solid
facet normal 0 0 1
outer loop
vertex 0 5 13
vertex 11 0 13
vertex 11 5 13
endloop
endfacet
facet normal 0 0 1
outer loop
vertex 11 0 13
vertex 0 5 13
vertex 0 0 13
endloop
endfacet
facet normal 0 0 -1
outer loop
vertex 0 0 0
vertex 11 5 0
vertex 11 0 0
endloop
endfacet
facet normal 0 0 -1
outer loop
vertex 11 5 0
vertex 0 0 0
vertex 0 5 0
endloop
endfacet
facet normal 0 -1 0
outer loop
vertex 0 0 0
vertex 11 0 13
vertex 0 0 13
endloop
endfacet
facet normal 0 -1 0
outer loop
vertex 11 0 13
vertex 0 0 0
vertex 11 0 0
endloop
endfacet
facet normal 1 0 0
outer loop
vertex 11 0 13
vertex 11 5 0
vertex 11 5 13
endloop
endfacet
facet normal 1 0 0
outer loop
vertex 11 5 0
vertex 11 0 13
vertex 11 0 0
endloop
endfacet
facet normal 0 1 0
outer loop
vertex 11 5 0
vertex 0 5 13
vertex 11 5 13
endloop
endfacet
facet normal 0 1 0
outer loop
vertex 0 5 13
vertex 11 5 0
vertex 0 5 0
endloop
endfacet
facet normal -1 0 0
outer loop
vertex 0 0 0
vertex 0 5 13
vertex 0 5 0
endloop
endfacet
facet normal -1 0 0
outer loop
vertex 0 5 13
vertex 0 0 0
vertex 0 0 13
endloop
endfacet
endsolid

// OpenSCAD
// Generated by SolidPython 1.0.1 on 2020-07-29 00:46:55


cube(size = [11, 5, 13]);
/***********************************************
*********      SolidPython code:      **********
************************************************
 
# import packages: SolidPython
from solid import *
from solid.utils import *
from itertools import chain, combinations, permutations


class Resize:

    def __init__(self, scad_file):
        self.scad_file = scad_file
        #self.scad_file = import_scad(scad_file)
        # cone/cylinder param:
        self.r1 = 0
        self.r2 = 0
        self.h = 0
        # rectangular prism param:
        self.w = 0
        self.l = 0
        # ellipse param:
        self.r = 0

    # import OpenScad code (file name corresponds to shape)


    # classify shape + parameters
    def assign(self, param1, param2, param3):
        if self.scad_file == 'cone.scad':
            self.r1 = param1
            self.r2 = param2
            self.h = param3
        elif self.scad_file == 'cylinder.scad':
            self.r1 = param1
            self.r2 = param2
            self.h = param3
        elif self.scad_file == 'rectangularPrism.scad':
            self.h = param1
            self.l = param2
            self.w = param3
        else:
            self.r = param1
            self.h = param2

    # resize parameters
    def iterate(self):
        x = range(3, 20, 2)
        i = 1
        if self.scad_file == 'cone.scad':
            tempList = list(permutations(x, 2))
            for temp in tempList:
                param1 = temp[0]
                param2 = temp[1]
                filepath = 'produced_scad_files/' + 'cone' + str(param1) + '_' + str(param2) + '_' + '.scad'
                scad_render_to_file(cylinder(h=param1, r1=param2, r2=0), filepath)

        elif self.scad_file == 'cylinder.scad':
            tempList = list(permutations(x, 3))
            for temp in tempList:
                param1 = temp[0]
                param2 = temp[1]
                filepath = 'produced_scad_files/' + 'cylinder' + str(param1) + '_' + str(param2) + '_' + '.scad'
                scad_render_to_file(cylinder(h=param1, r1=param2, r2=param2), filepath)

        elif self.scad_file == 'rectangularPrism.scad':
            tempList = list(permutations(x, 3))
            for temp in tempList:
                param1 = temp[0]
                param2 = temp[1]
                param3 = temp[2]
                filepath = 'produced_scad_files/' + 'rectangularPrism' + str(param1) + '_' + str(param2) + '_' + str(
                    param3) + '.scad'
                scad_render_to_file(cube(size=(param1, param2, param3)), filepath)

        elif self.scad_file == 'ellipse.scad':
            tempList = list(permutations(x, 4))
            for temp in tempList:
                param1 = temp[0]
                param2 = temp[1]
                param3 = temp[2]
                param4 = temp[3]
                filepath = 'produced_scad_files/' + 'ellipse' + str(param1) + '_' + str(param2) + '_' + str(param3) + '_' + str(param4) + '.scad'
                scad_render_to_file(scale([param1, param2, param3])(sphere(r=param4)), filepath)

    def render_to_scadfile(self):
        scad_render_to_file(scad, 'example.scad') 
 
************************************************/
